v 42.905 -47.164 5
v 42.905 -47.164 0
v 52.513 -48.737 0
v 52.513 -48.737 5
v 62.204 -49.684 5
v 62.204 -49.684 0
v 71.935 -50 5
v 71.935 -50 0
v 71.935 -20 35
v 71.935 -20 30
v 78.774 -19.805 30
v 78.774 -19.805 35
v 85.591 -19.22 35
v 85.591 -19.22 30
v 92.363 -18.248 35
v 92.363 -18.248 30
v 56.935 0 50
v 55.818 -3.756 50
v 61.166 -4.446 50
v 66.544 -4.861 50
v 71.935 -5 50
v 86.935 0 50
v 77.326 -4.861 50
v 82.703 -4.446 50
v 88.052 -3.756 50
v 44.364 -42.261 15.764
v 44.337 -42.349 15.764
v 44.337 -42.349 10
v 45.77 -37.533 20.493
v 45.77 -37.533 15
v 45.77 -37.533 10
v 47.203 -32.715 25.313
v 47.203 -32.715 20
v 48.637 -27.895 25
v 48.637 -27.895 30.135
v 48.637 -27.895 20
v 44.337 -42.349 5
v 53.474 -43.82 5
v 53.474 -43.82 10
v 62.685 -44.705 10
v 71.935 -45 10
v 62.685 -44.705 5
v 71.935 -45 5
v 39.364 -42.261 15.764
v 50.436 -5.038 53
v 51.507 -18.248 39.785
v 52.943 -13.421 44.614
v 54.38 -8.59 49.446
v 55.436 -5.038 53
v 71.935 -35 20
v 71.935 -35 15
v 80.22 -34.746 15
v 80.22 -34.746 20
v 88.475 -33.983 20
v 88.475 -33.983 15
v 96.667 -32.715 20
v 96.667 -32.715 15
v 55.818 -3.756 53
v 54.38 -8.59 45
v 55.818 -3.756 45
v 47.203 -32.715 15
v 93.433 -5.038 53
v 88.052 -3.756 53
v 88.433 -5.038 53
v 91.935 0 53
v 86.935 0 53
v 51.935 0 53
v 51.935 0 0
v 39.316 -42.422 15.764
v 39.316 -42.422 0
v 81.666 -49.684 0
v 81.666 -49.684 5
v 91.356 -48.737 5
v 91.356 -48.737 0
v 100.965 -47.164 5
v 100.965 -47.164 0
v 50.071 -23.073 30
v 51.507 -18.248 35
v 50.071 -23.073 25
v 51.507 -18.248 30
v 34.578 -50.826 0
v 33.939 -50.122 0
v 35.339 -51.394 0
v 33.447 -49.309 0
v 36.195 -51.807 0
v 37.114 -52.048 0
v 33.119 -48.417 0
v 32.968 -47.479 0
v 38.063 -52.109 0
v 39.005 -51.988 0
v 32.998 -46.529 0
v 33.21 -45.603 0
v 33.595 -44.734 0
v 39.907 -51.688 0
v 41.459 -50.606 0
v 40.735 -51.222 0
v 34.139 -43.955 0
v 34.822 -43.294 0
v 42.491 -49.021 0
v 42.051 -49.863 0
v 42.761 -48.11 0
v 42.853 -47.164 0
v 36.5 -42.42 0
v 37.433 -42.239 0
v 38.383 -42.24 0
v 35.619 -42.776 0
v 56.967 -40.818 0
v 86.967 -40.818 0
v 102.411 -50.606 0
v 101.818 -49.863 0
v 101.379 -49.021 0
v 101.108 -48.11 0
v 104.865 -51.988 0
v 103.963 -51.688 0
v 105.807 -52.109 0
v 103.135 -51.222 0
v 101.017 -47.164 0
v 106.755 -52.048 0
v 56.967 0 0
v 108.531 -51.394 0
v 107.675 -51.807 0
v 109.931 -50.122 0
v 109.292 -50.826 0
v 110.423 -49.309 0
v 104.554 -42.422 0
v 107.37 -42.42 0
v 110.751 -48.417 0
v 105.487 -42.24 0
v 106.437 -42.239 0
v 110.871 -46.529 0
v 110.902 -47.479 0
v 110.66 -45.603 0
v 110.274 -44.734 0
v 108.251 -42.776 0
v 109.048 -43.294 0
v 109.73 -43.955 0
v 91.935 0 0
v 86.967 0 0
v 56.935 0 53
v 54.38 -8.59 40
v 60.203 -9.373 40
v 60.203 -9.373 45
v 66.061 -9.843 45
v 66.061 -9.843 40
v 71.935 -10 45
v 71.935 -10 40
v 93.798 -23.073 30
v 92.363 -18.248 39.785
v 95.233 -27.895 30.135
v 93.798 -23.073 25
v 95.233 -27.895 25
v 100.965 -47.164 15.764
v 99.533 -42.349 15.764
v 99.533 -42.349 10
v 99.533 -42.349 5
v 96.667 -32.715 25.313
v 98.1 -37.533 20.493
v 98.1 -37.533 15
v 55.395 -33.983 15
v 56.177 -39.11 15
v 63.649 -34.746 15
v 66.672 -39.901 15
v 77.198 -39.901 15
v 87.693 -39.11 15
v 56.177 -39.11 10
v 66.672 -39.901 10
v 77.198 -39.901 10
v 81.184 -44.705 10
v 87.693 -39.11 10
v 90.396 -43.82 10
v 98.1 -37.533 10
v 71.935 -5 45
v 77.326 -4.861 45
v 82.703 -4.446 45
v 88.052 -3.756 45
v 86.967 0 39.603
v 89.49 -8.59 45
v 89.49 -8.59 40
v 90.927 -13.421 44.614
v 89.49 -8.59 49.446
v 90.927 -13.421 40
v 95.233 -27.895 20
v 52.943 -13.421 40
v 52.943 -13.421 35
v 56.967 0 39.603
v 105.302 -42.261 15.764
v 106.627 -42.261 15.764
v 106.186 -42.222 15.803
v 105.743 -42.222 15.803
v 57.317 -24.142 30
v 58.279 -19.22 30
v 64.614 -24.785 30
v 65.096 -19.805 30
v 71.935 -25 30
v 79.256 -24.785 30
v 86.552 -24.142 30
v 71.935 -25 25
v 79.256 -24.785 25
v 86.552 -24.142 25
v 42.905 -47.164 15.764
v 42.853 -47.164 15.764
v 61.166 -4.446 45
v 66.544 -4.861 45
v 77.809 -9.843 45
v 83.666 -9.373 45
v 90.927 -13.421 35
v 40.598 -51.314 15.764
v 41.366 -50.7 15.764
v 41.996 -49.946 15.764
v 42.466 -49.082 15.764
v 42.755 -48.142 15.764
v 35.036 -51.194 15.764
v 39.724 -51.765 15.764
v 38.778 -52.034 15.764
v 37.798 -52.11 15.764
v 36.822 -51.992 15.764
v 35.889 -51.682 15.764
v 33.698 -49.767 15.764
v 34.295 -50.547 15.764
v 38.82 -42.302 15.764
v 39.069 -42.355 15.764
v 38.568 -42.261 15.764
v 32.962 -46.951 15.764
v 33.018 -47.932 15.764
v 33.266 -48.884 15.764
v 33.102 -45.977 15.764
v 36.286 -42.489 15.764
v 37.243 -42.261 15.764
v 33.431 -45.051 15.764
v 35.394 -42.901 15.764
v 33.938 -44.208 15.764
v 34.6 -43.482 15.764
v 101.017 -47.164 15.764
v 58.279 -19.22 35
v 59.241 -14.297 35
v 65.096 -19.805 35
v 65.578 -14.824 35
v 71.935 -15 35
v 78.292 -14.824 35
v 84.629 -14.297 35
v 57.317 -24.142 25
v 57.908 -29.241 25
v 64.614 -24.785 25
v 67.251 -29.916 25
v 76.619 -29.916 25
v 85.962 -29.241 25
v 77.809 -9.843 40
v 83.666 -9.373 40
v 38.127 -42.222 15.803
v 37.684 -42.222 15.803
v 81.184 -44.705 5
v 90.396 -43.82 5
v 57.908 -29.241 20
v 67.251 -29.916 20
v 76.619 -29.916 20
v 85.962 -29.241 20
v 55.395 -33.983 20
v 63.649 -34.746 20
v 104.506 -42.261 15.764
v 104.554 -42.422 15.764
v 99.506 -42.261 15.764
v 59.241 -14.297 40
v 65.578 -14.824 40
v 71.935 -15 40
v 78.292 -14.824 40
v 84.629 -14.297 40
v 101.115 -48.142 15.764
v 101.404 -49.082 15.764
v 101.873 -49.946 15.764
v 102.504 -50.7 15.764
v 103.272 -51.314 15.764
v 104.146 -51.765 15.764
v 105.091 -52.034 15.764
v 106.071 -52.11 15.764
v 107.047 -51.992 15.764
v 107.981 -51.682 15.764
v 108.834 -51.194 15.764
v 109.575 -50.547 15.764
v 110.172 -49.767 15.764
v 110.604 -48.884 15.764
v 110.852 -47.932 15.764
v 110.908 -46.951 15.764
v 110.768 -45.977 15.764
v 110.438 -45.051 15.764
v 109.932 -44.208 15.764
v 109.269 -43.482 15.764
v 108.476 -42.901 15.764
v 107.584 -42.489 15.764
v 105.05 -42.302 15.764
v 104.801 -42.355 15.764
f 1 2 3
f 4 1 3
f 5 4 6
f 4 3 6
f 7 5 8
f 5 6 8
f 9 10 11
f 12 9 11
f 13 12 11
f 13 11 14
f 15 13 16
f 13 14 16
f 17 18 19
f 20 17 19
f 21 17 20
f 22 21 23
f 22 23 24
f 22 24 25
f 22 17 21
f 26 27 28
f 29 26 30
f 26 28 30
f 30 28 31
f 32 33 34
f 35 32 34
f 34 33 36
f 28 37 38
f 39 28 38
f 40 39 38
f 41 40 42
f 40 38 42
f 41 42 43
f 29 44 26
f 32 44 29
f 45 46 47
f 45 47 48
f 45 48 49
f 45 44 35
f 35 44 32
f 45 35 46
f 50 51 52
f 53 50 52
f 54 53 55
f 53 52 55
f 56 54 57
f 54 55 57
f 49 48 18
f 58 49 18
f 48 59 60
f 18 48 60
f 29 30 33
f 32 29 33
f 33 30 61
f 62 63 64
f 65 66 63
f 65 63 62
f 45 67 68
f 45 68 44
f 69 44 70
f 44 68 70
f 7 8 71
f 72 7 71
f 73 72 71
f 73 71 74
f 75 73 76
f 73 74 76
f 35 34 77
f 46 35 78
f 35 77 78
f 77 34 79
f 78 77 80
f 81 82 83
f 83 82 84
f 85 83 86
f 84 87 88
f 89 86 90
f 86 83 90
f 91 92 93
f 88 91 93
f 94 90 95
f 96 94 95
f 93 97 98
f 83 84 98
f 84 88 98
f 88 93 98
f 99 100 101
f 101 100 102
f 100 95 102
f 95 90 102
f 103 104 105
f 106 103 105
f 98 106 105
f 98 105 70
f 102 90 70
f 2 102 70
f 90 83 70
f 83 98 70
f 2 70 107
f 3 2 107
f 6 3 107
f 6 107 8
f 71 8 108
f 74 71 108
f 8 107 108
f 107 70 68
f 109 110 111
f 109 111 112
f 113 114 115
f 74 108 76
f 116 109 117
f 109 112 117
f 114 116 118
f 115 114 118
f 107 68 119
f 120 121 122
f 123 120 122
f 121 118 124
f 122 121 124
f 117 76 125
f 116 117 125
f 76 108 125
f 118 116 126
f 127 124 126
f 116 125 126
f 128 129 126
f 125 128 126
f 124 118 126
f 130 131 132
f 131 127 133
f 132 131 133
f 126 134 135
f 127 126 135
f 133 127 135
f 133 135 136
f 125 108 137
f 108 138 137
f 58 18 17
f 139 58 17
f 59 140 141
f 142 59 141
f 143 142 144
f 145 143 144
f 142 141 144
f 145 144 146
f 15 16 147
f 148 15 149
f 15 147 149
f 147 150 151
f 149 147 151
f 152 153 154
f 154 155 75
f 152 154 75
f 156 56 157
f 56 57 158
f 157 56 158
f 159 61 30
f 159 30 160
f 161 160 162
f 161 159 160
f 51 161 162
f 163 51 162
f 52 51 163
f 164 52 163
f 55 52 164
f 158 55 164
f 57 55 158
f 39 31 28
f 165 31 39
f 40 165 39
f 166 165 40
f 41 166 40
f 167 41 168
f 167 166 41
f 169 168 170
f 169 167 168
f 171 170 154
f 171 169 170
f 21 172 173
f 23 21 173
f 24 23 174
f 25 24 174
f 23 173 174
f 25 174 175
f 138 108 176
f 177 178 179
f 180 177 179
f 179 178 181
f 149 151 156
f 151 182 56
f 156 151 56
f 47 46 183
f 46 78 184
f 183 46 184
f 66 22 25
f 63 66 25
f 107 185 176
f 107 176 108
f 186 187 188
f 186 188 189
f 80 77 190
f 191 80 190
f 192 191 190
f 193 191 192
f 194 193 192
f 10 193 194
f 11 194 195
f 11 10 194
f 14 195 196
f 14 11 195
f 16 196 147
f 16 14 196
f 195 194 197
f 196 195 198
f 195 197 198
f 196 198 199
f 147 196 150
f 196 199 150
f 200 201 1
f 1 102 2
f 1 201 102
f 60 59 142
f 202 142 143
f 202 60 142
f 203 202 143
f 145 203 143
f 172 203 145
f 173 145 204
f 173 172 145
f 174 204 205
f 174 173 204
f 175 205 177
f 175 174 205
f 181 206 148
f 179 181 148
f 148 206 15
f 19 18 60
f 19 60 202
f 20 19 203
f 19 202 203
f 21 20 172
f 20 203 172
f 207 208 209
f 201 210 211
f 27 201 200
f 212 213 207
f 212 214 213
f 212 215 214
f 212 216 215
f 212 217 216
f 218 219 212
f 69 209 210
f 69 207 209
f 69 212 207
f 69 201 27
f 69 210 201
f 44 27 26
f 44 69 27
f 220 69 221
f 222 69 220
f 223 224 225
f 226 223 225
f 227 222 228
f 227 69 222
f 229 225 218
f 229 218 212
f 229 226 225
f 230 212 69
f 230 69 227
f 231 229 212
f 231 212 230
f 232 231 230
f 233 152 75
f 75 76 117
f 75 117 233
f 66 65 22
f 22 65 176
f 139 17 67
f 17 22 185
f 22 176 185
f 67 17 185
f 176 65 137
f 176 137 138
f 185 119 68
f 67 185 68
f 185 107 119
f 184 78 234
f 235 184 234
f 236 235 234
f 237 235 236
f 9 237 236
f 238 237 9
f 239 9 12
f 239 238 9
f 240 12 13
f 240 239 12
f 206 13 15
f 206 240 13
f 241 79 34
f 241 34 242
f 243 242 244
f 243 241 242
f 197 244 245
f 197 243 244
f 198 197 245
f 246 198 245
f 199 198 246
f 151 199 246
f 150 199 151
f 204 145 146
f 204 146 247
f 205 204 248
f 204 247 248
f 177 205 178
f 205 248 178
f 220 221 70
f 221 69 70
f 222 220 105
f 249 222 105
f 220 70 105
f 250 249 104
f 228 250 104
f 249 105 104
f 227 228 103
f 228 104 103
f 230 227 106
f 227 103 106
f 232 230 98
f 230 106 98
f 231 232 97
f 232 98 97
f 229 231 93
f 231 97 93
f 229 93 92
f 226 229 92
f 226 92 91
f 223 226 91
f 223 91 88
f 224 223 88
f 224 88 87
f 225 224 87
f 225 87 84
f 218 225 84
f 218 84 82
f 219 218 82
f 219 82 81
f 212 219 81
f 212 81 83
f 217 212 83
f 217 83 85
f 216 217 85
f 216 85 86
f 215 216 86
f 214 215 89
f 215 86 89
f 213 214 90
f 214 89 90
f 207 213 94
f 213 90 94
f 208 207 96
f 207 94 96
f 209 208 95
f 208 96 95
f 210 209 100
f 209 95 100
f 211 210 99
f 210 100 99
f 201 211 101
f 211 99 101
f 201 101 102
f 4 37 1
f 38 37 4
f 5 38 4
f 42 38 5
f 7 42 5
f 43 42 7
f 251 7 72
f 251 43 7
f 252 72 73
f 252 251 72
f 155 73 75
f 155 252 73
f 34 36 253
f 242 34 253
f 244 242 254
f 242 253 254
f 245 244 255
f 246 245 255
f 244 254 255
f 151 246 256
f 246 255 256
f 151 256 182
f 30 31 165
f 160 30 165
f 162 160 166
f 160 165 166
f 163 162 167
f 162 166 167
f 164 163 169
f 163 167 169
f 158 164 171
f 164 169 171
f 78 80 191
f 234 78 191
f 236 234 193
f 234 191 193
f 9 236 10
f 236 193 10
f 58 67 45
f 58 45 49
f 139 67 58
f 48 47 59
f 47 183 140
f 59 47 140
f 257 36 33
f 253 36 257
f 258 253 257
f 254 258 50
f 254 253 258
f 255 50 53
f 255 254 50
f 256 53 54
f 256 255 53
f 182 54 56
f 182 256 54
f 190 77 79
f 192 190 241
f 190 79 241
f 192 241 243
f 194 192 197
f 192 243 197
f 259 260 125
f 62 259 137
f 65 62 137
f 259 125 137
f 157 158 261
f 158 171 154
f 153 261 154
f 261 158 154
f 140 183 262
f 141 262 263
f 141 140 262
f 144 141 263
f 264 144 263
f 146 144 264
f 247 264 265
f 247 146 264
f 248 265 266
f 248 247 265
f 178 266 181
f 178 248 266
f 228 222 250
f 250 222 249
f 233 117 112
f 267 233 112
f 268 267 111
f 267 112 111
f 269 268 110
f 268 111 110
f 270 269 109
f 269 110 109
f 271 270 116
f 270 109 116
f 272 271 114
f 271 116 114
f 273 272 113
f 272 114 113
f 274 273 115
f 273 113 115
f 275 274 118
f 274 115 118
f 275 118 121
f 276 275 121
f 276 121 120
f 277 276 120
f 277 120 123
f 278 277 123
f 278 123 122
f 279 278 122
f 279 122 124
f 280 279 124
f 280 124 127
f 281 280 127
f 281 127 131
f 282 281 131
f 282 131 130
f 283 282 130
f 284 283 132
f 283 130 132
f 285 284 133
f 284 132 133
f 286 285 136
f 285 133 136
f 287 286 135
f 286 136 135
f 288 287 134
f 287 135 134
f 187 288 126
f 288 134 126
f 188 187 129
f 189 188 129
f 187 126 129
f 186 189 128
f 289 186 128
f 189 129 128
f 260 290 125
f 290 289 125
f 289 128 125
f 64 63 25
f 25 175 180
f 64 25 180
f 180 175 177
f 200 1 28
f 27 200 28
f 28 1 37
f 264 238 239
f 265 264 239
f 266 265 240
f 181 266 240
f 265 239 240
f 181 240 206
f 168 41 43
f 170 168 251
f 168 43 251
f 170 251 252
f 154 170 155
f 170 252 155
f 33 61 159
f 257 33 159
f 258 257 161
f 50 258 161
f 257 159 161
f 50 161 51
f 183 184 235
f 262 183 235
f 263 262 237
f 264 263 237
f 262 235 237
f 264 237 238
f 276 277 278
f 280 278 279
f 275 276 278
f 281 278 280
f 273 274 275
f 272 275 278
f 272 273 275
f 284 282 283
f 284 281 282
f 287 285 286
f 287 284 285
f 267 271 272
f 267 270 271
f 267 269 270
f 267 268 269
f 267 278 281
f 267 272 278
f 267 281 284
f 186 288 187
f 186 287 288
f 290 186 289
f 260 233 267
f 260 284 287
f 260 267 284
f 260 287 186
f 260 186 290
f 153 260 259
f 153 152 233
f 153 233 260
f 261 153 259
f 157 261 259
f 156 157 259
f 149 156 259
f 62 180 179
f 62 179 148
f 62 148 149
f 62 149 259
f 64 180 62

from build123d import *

# Parameters (mm, degrees)
F1_DEPTH  = 10
F2_DEPTH  = 20
F3_DEPTH  = 30
F4_DEPTH  = 40
F5_DEPTH  = 50
F6_DEPTH  = 60
F7_DEPTH  = 70
F8_DEPTH  = 80
F9_DEPTH  = 90
F10_DEPTH = 100
F11_DEPTH = 106
F13_DEPTH = 200
F14_START = 62
F14_DEPTH = 60
F15_SCALE = 0.5


with BuildPart() as f1:
    # F0 (on Top) → F1 (new body)
    with BuildSketch(Plane.XY):
        with BuildLine():
            Line((36.7396253365, -84.6989331727), (33.8752285407, -94.3281765161))
            ThreePointArc((33.8752285407, -94.3281765161), (62.7668696335, -98.5786771982), (91.9348918938, -100))
            Line((91.9348918939, -100), (91.9348918939, -90))
            ThreePointArc((91.9348918938, -90), (64.2102694445, -88.6716912169), (36.7396253365, -84.6989331727))
        make_face()
        with BuildLine():
            Line((91.9348918939, -90), (91.9348918939, -100))
            ThreePointArc((91.9348918938, -100), (121.1029141542, -98.5786771982), (149.994555247, -94.3281765161))
            Line((149.994555247, -94.3281765161), (147.1301584512, -84.6989331727))
            ThreePointArc((147.1301584512, -84.6989331727), (119.6595143432, -88.6716912169), (91.9348918938, -90))
        make_face()
    extrude(amount=F1_DEPTH)

    # F0 (on Top) → F2 (join)
    with BuildSketch(Plane.XY):
        with BuildLine():
            Line((39.6049710277, -75.0664999271), (36.7396253365, -84.6989331727))
            ThreePointArc((36.7396253365, -84.6989331727), (64.2102694445, -88.6716912169), (91.9348918938, -90))
            Line((91.9348918939, -90), (91.9348918939, -80))
            ThreePointArc((91.9348918938, -80), (65.6539099829, -78.7638964963), (39.6049710277, -75.0664999271))
        make_face()
        with BuildLine():
            Line((91.9348918939, -80), (91.9348918939, -90))
            ThreePointArc((91.9348918938, -90), (119.6595143432, -88.6716912169), (147.1301584512, -84.6989331727))
            Line((147.1301584512, -84.6989331727), (144.26481276, -75.0664999271))
            ThreePointArc((144.26481276, -75.0664999271), (118.2158738048, -78.7638964963), (91.9348918938, -80))
        make_face()
    extrude(amount=F2_DEPTH)

    # F0 (on Top) → F3 (join)
    with BuildSketch(Plane.XY):
        with BuildLine():
            Line((42.4713721555, -65.4305186204), (39.6049710277, -75.0664999271))
            ThreePointArc((39.6049710277, -75.0664999271), (65.6539099829, -78.7638964963), (91.9348918938, -80))
            Line((91.9348918939, -80), (91.9348918939, -70))
            ThreePointArc((91.9348918938, -70), (67.0978231005, -68.8552026905), (42.4713721555, -65.4305186204))
        make_face()
        with BuildLine():
            Line((91.9348918939, -70), (91.9348918939, -80))
            ThreePointArc((91.9348918938, -80), (118.2158738048, -78.7638964963), (144.26481276, -75.0664999271))
            Line((144.26481276, -75.0664999271), (141.3984116322, -65.4305186204))
            ThreePointArc((141.3984116322, -65.4305186204), (116.7719606872, -68.8552026905), (91.9348918938, -70))
        make_face()
    extrude(amount=F3_DEPTH)

    # F0 (on Top) → F4 (join)
    with BuildSketch(Plane.XY):
        with BuildLine():
            Line((45.3389518797, -55.7905752255), (42.4713721555, -65.4305186204))
            ThreePointArc((42.4713721555, -65.4305186204), (67.0978231005, -68.8552026905), (91.9348918938, -70))
            Line((91.9348918939, -70), (91.9348918939, -60))
            ThreePointArc((91.9348918938, -60), (68.5420463918, -58.945505424), (45.3389518797, -55.7905752255))
        make_face()
        with BuildLine():
            Line((91.9348918939, -60), (91.9348918939, -70))
            ThreePointArc((91.9348918938, -70), (116.7719606872, -68.8552026905), (141.3984116322, -65.4305186204))
            Line((141.3984116322, -65.4305186204), (138.530831908, -55.7905752255))
            ThreePointArc((138.530831908, -55.7905752255), (115.3277373959, -58.9455054241), (91.9348918938, -60))
        make_face()
    extrude(amount=F4_DEPTH)

    # F0 (on Top) → F5 (join)
    with BuildSketch(Plane.XY):
        with BuildLine():
            Line((48.2078533621, -46.146188476), (45.3389518797, -55.7905752255))
            ThreePointArc((45.3389518797, -55.7905752255), (68.5420463918, -58.945505424), (91.9348918938, -60))
            Line((91.9348918939, -60), (91.9348918939, -50))
            ThreePointArc((91.9348918938, -50), (69.9866245248, -49.0346834469), (48.2078533621, -46.146188476))
        make_face()
        with BuildLine():
            Line((91.9348918939, -50), (91.9348918939, -60))
            ThreePointArc((91.9348918938, -60), (115.3277373959, -58.9455054241), (138.530831908, -55.7905752255))
            Line((138.530831908, -55.7905752255), (135.6619304256, -46.146188476))
            ThreePointArc((135.6619304256, -46.146188476), (113.8831592629, -49.0346834469), (91.9348918938, -50))
        make_face()
    extrude(amount=F5_DEPTH)

    # F0 (on Top) → F6 (join)
    with BuildSketch(Plane.XY):
        with BuildLine():
            Line((51.0782440128, -36.4967955891), (48.2078533621, -46.146188476))
            ThreePointArc((48.2078533621, -46.146188476), (69.9866245248, -49.0346834469), (91.9348918938, -50))
            Line((91.9348918939, -50), (91.9348918939, -40))
            ThreePointArc((91.9348918938, -40), (71.4316109538, -39.1225950652), (51.0782440128, -36.4967955891))
        make_face()
        with BuildLine():
            Line((91.9348918939, -40), (91.9348918939, -50))
            ThreePointArc((91.9348918938, -50), (113.8831592629, -49.0346834469), (135.6619304256, -46.146188476))
            Line((135.6619304256, -46.146188476), (132.7915397749, -36.4967955891))
            ThreePointArc((132.7915397749, -36.4967955891), (112.4381728339, -39.1225950652), (91.9348918938, -40))
        make_face()
    extrude(amount=F6_DEPTH)

    # F0 (on Top) → F7 (join)
    with BuildSketch(Plane.XY):
        with BuildLine():
            Line((53.9503208714, -26.8417341766), (51.0782440128, -36.4967955891))
            ThreePointArc((51.0782440128, -36.4967955891), (71.4316109538, -39.1225950652), (91.9348918938, -40))
            Line((91.9348918939, -40), (91.9348918939, -30))
            ThreePointArc((91.9348918938, -30), (72.8770701481, -29.2090736212), (53.9503208714, -26.8417341766))
        make_face()
        with BuildLine():
            Line((91.9348918939, -30), (91.9348918939, -40))
            ThreePointArc((91.9348918938, -40), (112.4381728339, -39.1225950652), (132.7915397749, -36.4967955891))
            Line((132.7915397749, -36.4967955891), (129.9194629163, -26.8417341766))
            ThreePointArc((129.9194629163, -26.8417341766), (110.9927136396, -29.2090736212), (91.9348918938, -30))
        make_face()
    extrude(amount=F7_DEPTH)

    # F0 (on Top) → F8 (join)
    with BuildSketch(Plane.XY):
        with BuildLine():
            ThreePointArc((91.9348918938, -20), (74.323080523, -19.2939217129), (56.824317494, -17.1802190931))
            Line((56.824317494, -17.1802190931), (53.9503208714, -26.8417341766))
            ThreePointArc((53.9503208714, -26.8417341766), (72.8770701481, -29.2090736212), (91.9348918938, -30))
            Line((91.9348918939, -30), (91.9348918939, -20))
        make_face()
        with BuildLine():
            ThreePointArc((127.0454662937, -17.1802190931), (109.5467032647, -19.2939217129), (91.9348918938, -20))
            Line((91.9348918939, -20), (91.9348918939, -30))
            ThreePointArc((91.9348918938, -30), (110.9927136396, -29.2090736212), (129.9194629163, -26.8417341766))
            Line((129.9194629163, -26.8417341766), (127.0454662937, -17.1802190931))
        make_face()
    extrude(amount=F8_DEPTH)

    # F0 (on Top) → F9 (join)
    with BuildSketch(Plane.XY):
        with BuildLine():
            ThreePointArc((91.9348918938, -10), (75.7697383448, -9.3769037185), (59.7005128631, -7.5113124832))
            Line((59.7005128631, -7.5113124832), (56.824317494, -17.1802190931))
            ThreePointArc((56.824317494, -17.1802190931), (74.323080523, -19.2939217129), (91.9348918938, -20))
            Line((91.9348918939, -20), (91.9348918939, -10))
        make_face()
        with BuildLine():
            ThreePointArc((124.1692709246, -7.5113124832), (108.1000454429, -9.3769037185), (91.9348918938, -10))
            Line((91.9348918939, -10), (91.9348918939, -20))
            ThreePointArc((91.9348918938, -20), (109.5467032647, -19.2939217129), (127.0454662937, -17.1802190931))
            Line((127.0454662937, -17.1802190931), (124.1692709246, -7.5113124832))
        make_face()
    extrude(amount=F9_DEPTH)

    # F0 (on Top) → F10 (join)
    with BuildSketch(Plane.XY):
        with BuildLine():
            Line((91.9348918939, 0), (61.9348918939, 0))
            Line((61.9348918939, 0), (59.7005128631, -7.5113124832))
            ThreePointArc((59.7005128631, -7.5113124832), (75.7697383448, -9.3769037185), (91.9348918938, -10))
            Line((91.9348918939, -10), (91.9348918939, 0))
        make_face()
        with BuildLine():
            Line((121.9348918939, 0), (91.9348918939, 0))
            Line((91.9348918939, 0), (91.9348918939, -10))
            ThreePointArc((91.9348918938, -10), (108.1000454429, -9.3769037185), (124.1692709246, -7.5113124832))
            Line((124.1692709246, -7.5113124832), (121.9348918939, 0))
        make_face()
    extrude(amount=F10_DEPTH)

    # F0 (on Top) → F11 (join)
    with BuildSketch(Plane.XY):
        with BuildLine():
            Line((33.7702630603, -94.3281765161), (33.8752285407, -94.3281765161))
            Line((33.8752285407, -94.3281765161), (36.7396253365, -84.6989331727))
            Line((36.7396253365, -84.6989331727), (39.6049710277, -75.0664999271))
            Line((39.6049710277, -75.0664999271), (42.4713721555, -65.4305186204))
            Line((42.4713721555, -65.4305186204), (45.3389518797, -55.7905752255))
            Line((45.3389518797, -55.7905752255), (48.2078533621, -46.146188476))
            Line((48.2078533621, -46.146188476), (51.0782440128, -36.4967955891))
            Line((51.0782440128, -36.4967955891), (53.9503208714, -26.8417341766))
            Line((53.9503208714, -26.8417341766), (56.824317494, -17.1802190931))
            Line((56.824317494, -17.1802190931), (59.7005128631, -7.5113124832))
            Line((59.7005128631, -7.5113124832), (61.9348918939, 0))
            Line((61.9348918939, 0), (51.9348918939, 0))
            Line((51.9348918939, 0), (26.696511225, -84.843869891))
            ThreePointArc((26.696511225, -84.843869891), (15.9433814137, -100.2440457927), (33.7702630603, -94.3281765161))
        make_face()
        with BuildLine():
            Line((147.1301584512, -84.6989331727), (149.994555247, -94.3281765161))
            Line((149.994555247, -94.3281765161), (150.0995207274, -94.3281765162))
            ThreePointArc((150.0995207274, -94.3281765162), (167.926402374, -100.2440457927), (157.1732725628, -84.843869891))
            Line((157.1732725628, -84.843869891), (131.9348918939, 0))
            Line((131.9348918939, 0), (121.9348918939, 0))
            Line((121.9348918939, 0), (124.1692709246, -7.5113124832))
            Line((124.1692709246, -7.5113124832), (127.0454662937, -17.1802190931))
            Line((127.0454662937, -17.1802190931), (129.9194629163, -26.8417341766))
            Line((129.9194629163, -26.8417341766), (132.7915397749, -36.4967955891))
            Line((132.7915397749, -36.4967955891), (135.6619304256, -46.146188476))
            Line((135.6619304256, -46.146188476), (138.530831908, -55.7905752255))
            Line((138.530831908, -55.7905752255), (141.3984116322, -65.4305186204))
            Line((141.3984116322, -65.4305186204), (144.26481276, -75.0664999271))
            Line((144.26481276, -75.0664999271), (147.1301584512, -84.6989331727))
        make_face()
    extrude(amount=F11_DEPTH)

    # F12 (on Right) → F13 (cut)
    with BuildSketch(Plane.YZ):
        Polygon((-84.5222696662, 31.5275415778), (-10, 106.075361371), (-105.4867506027, 106.075361371), (-105.4867506027, 31.5275415778), align=None)
    extrude(amount=F13_DEPTH, mode=Mode.SUBTRACT)

    # F12 (on Right) → F14 (cut)
    with BuildSketch(Plane.YZ.offset(F14_START)):
        Polygon((0, 79.2063996196), (-81.6366150975, 0), (0, 0), align=None)
    extrude(amount=F14_DEPTH, mode=Mode.SUBTRACT)


with BuildPart() as f1_1:
    # F15: moved
    add(f1.part.scale(F15_SCALE).moved(Location((25.9674459469, 0, 0))))


solid = f1_1.part
